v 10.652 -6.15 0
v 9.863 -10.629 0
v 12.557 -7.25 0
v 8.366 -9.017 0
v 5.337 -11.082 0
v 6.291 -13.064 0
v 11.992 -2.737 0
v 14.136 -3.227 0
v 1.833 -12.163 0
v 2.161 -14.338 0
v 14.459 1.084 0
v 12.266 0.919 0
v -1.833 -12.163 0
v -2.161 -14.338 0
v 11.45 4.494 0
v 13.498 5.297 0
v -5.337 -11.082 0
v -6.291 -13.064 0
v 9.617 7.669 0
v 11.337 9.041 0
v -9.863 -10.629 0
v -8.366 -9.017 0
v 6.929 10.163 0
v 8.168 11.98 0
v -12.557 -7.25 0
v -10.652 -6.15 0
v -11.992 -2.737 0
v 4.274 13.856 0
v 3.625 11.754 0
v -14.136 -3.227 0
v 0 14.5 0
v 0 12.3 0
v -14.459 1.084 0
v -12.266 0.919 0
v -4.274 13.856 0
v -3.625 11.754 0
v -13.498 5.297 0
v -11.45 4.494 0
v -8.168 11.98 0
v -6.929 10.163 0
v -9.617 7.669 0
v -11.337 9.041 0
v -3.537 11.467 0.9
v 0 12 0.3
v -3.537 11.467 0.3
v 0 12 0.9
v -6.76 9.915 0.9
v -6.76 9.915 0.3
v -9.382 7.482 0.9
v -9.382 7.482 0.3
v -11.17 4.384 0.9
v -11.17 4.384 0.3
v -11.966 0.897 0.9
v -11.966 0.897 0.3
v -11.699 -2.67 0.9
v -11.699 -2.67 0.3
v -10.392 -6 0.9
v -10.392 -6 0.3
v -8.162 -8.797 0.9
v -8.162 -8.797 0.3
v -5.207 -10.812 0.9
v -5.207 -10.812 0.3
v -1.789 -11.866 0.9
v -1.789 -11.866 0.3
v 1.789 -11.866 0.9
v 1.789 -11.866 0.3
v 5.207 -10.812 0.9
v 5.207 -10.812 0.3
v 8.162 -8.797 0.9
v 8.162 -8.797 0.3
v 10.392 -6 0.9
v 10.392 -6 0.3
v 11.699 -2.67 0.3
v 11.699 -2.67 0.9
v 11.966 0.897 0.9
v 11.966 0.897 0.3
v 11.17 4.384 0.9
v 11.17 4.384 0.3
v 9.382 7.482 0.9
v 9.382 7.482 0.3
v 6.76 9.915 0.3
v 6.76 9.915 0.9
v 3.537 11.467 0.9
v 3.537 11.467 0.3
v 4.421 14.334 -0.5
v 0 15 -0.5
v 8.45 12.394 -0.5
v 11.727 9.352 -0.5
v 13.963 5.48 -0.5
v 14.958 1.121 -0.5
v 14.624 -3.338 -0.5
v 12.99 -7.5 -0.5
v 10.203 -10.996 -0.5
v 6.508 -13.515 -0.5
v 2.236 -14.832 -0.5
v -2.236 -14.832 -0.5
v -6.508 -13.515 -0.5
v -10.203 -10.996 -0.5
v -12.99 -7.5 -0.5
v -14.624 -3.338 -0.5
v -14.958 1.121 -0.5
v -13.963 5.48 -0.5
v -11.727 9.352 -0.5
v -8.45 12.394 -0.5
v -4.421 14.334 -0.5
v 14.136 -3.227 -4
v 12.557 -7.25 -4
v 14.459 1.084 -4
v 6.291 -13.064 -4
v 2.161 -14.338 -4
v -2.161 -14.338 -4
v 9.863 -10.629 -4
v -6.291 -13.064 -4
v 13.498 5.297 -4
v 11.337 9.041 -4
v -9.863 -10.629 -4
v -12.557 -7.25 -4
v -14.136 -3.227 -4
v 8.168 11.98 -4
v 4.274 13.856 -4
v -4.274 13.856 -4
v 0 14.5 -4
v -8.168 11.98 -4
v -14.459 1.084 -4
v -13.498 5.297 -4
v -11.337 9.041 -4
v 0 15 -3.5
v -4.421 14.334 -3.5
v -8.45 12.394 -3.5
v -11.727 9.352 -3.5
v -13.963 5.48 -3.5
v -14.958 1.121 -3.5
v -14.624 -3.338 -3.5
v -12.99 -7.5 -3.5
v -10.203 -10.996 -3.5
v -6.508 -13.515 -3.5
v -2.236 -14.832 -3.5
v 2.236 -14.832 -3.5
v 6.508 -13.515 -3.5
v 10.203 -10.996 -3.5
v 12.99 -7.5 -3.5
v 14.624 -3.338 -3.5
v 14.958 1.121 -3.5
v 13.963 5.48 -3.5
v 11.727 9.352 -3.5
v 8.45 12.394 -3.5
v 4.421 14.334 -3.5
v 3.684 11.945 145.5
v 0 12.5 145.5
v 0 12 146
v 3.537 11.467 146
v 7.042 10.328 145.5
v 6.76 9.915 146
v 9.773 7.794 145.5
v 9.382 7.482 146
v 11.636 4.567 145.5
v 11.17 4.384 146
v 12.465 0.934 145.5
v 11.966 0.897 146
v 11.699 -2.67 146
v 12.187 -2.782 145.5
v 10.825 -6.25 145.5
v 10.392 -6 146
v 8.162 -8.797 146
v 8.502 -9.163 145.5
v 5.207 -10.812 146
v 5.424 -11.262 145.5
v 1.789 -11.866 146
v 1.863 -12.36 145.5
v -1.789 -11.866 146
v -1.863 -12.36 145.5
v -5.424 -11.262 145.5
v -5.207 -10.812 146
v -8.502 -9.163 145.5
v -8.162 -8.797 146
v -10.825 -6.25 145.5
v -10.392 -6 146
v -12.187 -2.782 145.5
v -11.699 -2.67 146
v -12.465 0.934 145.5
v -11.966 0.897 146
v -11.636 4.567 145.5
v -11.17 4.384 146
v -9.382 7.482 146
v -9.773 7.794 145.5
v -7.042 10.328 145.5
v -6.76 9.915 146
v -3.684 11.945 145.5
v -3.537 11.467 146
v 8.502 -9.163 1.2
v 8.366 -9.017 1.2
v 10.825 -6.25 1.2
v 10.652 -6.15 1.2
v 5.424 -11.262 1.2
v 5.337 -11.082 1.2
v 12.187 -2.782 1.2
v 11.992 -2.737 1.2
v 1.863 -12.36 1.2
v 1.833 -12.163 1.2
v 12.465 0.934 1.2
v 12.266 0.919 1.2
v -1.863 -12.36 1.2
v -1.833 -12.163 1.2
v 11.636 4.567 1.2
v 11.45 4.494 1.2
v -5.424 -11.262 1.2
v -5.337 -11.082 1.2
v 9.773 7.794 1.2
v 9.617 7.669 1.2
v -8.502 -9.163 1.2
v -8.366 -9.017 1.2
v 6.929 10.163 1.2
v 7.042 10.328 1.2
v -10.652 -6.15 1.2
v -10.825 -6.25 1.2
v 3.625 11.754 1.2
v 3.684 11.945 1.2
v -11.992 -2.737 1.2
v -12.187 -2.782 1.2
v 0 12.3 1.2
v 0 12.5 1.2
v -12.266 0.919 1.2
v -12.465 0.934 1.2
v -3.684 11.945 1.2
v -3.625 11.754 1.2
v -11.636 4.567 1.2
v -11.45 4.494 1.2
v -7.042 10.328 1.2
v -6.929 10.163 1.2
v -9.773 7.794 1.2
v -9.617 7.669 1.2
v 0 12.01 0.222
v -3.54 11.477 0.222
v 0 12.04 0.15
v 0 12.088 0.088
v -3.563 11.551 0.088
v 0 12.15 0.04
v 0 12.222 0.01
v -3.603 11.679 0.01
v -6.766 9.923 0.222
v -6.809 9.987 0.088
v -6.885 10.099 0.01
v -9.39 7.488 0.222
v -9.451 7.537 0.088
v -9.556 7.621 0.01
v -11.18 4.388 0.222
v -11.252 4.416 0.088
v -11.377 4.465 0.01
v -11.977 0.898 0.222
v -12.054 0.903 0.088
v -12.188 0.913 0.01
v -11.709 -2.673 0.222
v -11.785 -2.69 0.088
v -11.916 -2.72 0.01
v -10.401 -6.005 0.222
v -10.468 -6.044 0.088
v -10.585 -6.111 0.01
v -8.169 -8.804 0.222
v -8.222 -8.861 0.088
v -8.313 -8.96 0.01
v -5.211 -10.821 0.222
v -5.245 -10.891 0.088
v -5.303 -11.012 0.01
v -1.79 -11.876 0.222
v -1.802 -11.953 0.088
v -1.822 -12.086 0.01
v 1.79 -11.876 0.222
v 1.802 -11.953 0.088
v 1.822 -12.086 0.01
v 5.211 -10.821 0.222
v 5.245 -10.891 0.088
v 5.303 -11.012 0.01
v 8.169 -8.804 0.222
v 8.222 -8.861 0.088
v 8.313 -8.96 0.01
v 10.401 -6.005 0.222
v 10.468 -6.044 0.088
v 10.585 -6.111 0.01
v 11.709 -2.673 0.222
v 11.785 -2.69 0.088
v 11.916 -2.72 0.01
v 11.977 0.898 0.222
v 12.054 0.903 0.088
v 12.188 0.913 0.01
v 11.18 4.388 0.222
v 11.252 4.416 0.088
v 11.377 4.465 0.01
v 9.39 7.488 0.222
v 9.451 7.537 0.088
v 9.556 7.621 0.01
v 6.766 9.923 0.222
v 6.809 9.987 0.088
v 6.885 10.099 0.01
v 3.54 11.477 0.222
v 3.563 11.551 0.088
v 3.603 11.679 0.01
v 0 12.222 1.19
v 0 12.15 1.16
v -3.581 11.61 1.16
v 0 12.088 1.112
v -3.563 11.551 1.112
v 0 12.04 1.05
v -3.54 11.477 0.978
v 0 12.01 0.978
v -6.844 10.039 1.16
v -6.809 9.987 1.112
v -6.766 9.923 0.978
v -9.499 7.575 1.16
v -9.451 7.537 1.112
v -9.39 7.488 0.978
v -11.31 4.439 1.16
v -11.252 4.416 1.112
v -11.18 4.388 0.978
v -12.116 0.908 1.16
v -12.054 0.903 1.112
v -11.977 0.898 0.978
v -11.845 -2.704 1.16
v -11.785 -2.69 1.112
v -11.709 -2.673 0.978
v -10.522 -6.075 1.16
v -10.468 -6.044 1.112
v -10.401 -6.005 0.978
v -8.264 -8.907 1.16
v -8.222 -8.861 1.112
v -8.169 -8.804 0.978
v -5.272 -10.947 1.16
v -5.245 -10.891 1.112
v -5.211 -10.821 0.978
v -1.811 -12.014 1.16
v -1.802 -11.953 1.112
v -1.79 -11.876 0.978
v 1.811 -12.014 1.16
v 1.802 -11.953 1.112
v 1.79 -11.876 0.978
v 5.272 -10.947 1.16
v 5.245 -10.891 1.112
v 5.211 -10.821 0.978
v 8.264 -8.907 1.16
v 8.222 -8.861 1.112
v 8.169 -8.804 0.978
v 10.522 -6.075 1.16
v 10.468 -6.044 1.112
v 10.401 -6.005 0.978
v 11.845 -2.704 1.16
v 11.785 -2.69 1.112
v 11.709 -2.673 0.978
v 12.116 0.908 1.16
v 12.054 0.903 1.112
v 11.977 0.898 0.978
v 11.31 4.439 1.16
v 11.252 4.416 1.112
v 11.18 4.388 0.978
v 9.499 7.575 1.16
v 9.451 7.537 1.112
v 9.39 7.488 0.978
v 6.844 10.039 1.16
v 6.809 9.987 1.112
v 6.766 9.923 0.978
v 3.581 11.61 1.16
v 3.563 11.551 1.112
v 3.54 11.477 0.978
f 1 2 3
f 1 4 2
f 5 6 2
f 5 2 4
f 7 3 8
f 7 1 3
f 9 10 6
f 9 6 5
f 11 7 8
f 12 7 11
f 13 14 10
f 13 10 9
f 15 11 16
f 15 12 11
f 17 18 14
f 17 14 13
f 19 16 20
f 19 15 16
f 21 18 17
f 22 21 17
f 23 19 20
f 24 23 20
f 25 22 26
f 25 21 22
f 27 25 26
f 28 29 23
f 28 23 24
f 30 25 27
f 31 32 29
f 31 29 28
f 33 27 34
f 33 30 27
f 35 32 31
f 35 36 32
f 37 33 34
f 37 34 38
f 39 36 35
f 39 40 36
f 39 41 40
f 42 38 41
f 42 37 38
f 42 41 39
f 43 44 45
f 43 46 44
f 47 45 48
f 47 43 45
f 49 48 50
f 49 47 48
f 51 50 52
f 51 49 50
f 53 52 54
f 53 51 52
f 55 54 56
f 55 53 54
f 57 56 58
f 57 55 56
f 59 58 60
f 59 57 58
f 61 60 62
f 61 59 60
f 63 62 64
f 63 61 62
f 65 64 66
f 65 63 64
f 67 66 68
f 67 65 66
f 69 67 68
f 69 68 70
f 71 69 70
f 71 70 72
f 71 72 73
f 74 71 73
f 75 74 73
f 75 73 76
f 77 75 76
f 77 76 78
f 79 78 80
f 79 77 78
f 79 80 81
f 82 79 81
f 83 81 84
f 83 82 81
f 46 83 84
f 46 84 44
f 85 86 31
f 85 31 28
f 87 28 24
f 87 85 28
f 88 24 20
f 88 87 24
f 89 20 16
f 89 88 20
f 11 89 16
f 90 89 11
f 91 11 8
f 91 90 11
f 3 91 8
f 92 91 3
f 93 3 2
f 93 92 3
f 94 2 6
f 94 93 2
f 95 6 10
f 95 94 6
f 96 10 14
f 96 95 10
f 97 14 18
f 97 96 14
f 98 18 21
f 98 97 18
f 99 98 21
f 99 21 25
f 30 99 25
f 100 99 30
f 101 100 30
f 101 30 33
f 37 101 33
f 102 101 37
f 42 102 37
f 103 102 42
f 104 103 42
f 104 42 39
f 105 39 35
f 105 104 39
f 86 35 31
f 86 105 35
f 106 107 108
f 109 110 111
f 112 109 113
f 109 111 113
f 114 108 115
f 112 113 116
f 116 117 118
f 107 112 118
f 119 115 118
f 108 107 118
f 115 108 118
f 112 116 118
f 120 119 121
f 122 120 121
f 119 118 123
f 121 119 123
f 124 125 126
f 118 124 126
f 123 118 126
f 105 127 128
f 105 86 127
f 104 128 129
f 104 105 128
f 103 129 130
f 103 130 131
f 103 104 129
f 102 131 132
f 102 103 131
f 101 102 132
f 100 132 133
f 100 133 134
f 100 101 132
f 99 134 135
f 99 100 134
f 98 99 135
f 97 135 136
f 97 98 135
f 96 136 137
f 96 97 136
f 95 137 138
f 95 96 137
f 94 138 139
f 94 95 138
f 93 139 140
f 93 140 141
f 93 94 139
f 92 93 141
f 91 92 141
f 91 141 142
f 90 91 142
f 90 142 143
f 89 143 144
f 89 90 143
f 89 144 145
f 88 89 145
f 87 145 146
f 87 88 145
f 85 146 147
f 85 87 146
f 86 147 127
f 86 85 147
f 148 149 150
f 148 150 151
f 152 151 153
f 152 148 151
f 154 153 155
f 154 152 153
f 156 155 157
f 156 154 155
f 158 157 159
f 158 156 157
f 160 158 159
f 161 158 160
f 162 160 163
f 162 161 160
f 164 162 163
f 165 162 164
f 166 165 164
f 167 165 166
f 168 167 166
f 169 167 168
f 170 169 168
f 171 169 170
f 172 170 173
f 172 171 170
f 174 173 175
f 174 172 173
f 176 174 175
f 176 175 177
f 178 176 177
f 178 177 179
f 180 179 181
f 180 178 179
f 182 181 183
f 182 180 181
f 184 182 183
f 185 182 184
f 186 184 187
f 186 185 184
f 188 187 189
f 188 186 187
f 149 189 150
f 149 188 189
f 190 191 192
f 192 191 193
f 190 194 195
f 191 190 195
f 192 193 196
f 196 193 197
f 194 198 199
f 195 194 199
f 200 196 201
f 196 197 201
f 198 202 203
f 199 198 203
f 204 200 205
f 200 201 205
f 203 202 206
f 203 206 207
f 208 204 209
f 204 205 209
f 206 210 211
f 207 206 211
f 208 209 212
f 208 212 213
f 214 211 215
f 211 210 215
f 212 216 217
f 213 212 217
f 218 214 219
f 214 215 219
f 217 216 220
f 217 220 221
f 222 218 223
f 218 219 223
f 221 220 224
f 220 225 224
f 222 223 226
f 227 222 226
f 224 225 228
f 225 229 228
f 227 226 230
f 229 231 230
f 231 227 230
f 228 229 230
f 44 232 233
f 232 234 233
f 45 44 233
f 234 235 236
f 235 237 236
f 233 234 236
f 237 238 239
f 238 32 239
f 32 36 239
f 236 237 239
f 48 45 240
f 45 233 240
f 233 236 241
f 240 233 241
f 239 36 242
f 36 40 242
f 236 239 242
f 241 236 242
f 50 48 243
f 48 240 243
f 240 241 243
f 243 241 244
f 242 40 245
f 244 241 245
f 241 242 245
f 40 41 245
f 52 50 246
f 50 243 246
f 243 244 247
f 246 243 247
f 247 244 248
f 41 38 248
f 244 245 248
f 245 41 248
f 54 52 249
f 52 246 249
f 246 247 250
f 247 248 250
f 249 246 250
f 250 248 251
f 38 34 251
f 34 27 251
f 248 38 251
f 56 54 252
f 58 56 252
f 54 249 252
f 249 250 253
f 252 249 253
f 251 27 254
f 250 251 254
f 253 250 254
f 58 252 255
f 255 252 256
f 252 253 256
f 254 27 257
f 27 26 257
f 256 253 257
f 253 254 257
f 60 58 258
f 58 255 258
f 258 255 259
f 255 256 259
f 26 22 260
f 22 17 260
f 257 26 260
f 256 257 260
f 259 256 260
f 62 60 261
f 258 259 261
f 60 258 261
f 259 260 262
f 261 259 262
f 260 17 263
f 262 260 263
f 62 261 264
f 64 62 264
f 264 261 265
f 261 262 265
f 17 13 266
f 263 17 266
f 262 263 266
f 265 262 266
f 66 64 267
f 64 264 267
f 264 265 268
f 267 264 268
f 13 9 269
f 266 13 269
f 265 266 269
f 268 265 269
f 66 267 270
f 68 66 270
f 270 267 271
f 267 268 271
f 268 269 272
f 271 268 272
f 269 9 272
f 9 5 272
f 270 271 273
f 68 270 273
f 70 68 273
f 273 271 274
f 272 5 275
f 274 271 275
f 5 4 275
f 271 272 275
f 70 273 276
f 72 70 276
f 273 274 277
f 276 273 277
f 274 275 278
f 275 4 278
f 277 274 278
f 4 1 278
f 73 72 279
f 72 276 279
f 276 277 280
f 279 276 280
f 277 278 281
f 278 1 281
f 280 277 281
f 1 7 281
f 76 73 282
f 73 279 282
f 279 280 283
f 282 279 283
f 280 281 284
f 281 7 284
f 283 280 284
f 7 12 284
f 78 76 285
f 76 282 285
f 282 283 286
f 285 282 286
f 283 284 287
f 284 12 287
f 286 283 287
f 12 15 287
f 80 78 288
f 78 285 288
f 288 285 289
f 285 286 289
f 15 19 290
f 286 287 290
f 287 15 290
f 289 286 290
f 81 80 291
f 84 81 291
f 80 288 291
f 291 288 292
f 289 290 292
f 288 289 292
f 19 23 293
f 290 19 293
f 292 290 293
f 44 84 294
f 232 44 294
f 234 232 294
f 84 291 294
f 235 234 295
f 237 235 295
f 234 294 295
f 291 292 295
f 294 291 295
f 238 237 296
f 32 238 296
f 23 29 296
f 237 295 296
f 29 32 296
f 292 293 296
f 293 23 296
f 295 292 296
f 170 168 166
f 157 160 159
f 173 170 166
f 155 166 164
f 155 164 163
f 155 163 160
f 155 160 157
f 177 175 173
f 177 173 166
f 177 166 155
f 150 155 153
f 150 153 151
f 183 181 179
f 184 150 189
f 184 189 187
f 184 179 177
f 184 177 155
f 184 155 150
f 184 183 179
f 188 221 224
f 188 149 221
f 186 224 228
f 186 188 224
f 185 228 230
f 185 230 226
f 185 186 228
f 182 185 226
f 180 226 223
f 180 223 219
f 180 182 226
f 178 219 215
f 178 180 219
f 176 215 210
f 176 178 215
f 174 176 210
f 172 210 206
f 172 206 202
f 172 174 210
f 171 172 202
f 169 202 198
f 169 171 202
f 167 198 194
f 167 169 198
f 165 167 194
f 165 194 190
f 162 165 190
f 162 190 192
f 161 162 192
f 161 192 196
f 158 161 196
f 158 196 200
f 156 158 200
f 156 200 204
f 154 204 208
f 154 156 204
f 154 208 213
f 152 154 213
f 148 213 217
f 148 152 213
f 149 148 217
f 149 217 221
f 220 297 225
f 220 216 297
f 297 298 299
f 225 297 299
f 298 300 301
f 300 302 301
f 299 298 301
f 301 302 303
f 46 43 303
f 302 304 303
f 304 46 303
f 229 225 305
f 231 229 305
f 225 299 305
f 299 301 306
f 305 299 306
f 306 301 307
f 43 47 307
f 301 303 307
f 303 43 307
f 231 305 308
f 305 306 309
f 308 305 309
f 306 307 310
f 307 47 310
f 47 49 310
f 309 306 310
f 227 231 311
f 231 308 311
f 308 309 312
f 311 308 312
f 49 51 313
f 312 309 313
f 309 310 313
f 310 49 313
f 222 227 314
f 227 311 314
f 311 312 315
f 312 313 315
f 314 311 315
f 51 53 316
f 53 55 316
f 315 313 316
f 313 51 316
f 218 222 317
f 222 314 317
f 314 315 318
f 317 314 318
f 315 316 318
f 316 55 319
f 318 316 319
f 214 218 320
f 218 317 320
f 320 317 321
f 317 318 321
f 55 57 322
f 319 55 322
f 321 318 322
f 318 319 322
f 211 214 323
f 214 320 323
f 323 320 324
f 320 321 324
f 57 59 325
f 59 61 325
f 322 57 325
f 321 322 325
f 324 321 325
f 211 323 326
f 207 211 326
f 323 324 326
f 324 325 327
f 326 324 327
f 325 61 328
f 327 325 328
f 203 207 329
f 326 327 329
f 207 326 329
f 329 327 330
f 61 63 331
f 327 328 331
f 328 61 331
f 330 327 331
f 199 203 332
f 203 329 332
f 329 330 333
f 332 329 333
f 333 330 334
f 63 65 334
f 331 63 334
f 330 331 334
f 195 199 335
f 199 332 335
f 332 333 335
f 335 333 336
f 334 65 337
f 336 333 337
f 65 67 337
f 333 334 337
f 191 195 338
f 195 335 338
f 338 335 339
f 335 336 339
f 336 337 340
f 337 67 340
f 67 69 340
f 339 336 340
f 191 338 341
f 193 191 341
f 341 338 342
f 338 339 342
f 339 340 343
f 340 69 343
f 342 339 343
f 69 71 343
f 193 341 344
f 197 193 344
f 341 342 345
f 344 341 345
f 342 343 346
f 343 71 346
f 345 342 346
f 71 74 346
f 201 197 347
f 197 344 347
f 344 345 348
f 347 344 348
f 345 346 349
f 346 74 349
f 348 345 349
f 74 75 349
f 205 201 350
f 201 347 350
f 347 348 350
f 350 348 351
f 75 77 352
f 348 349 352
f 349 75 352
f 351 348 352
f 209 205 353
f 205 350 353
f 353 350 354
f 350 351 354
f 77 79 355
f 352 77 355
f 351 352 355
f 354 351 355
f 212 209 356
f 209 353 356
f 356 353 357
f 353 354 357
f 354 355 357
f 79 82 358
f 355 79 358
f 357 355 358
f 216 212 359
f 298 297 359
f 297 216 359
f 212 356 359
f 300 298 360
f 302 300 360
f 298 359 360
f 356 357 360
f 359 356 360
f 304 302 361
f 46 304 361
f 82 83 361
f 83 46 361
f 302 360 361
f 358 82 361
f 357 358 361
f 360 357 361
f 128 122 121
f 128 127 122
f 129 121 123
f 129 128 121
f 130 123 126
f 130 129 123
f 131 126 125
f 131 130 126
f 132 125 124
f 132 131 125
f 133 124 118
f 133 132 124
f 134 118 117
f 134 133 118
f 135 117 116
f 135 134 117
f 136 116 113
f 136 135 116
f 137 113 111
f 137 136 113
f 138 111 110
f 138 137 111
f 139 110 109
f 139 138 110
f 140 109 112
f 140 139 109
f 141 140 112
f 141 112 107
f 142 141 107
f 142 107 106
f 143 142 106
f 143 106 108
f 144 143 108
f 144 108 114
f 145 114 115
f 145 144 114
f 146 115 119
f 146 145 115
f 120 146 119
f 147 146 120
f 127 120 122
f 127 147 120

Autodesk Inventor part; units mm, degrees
ref_plane "YZ Plane" through (0, 0, 0) normal (1, 0, 0) x (0, 1, 0)
ref_plane "XZ Plane" through (0, 0, 0) normal (0, 1, 0) x (-1, 0, 0)
ref_plane "XY Plane" through (0, 0, 0) normal (0, 0, 1) x (1, 0, 0)
sketch "Sketch1" plane through (0, 0, 0) normal (1, 0, 0) x (0, 1, 0)
  line L0 (0, -15) -> (0, 62) projected
  line L1 (0, -4) -> (15, -4)
  line L2 (15, -4) -> (15, 0)
  line L3 (15, 0) -> (12.5, 0)
  line L4 (12.5, 0) -> (12.5, 146)
  line L5 (12.5, 146) -> (0, 146)
  line L6 (0, 146) -> (0, -4)
  point P0 (0, 0)
  dimension "d28" = 4
  dimension "d29" = 30
  dimension "d31" = 25
  dimension "d33" = 150
revolve "Revolution1" add sketch "Sketch1" angle 360 about axis through (0, 0, -10) along (0, 0, 1)
sketch "Sketch2" plane through (0, 0, 0) normal (1, 0, 0) x (0, 1, 0)
  line L0 (12.5, 146) -> (12.5, 0) construction
  line L1 (-12.5, 0) -> (12.5, 0) construction
  line L2 (12.5, 0) -> (12.3, 0)
  line L3 (12, 0.3) -> (12, 0.9)
  line L4 (12.3, 1.2) -> (12.5, 1.2)
  line L5 (12.5, 1.2) -> (12.5, 0)
  arc A0 (12.3, 1.2) -> (12, 0.9) centre (12.3, 0.9) ccw
  arc A1 (12, 0.3) -> (12.3, 0) centre (12.3, 0.3) ccw
  line L6 (0, -10.2746) -> (0, 61.2124) projected
  point P0 (0, 0)
  dimension "d45" = 0.3
  dimension "d46" = 1.2
  dimension "d47" = 0.5
revolve "Revolution2" cut sketch "Sketch2" angle 360 about axis through (0, 0, -10) along (0, 0, 1)
chamfer "Chamfer1" distance 0.5 angle 45 3 edges at (0, -12.5, 146) (0, -15, 0) (0, -15, -4)
equation "\"d28\" = H_"
equation "\"d29\" = D"
equation "\"d31\" = d_"
equation "\"d33\" = L"
equation "\"d_\" = 25"
equation "\"L\" = 150"
equation "\"D\" = 30"
equation "\"H_\" = 4"
properties part number "M-RPN25x150" material "SUJ 2"
